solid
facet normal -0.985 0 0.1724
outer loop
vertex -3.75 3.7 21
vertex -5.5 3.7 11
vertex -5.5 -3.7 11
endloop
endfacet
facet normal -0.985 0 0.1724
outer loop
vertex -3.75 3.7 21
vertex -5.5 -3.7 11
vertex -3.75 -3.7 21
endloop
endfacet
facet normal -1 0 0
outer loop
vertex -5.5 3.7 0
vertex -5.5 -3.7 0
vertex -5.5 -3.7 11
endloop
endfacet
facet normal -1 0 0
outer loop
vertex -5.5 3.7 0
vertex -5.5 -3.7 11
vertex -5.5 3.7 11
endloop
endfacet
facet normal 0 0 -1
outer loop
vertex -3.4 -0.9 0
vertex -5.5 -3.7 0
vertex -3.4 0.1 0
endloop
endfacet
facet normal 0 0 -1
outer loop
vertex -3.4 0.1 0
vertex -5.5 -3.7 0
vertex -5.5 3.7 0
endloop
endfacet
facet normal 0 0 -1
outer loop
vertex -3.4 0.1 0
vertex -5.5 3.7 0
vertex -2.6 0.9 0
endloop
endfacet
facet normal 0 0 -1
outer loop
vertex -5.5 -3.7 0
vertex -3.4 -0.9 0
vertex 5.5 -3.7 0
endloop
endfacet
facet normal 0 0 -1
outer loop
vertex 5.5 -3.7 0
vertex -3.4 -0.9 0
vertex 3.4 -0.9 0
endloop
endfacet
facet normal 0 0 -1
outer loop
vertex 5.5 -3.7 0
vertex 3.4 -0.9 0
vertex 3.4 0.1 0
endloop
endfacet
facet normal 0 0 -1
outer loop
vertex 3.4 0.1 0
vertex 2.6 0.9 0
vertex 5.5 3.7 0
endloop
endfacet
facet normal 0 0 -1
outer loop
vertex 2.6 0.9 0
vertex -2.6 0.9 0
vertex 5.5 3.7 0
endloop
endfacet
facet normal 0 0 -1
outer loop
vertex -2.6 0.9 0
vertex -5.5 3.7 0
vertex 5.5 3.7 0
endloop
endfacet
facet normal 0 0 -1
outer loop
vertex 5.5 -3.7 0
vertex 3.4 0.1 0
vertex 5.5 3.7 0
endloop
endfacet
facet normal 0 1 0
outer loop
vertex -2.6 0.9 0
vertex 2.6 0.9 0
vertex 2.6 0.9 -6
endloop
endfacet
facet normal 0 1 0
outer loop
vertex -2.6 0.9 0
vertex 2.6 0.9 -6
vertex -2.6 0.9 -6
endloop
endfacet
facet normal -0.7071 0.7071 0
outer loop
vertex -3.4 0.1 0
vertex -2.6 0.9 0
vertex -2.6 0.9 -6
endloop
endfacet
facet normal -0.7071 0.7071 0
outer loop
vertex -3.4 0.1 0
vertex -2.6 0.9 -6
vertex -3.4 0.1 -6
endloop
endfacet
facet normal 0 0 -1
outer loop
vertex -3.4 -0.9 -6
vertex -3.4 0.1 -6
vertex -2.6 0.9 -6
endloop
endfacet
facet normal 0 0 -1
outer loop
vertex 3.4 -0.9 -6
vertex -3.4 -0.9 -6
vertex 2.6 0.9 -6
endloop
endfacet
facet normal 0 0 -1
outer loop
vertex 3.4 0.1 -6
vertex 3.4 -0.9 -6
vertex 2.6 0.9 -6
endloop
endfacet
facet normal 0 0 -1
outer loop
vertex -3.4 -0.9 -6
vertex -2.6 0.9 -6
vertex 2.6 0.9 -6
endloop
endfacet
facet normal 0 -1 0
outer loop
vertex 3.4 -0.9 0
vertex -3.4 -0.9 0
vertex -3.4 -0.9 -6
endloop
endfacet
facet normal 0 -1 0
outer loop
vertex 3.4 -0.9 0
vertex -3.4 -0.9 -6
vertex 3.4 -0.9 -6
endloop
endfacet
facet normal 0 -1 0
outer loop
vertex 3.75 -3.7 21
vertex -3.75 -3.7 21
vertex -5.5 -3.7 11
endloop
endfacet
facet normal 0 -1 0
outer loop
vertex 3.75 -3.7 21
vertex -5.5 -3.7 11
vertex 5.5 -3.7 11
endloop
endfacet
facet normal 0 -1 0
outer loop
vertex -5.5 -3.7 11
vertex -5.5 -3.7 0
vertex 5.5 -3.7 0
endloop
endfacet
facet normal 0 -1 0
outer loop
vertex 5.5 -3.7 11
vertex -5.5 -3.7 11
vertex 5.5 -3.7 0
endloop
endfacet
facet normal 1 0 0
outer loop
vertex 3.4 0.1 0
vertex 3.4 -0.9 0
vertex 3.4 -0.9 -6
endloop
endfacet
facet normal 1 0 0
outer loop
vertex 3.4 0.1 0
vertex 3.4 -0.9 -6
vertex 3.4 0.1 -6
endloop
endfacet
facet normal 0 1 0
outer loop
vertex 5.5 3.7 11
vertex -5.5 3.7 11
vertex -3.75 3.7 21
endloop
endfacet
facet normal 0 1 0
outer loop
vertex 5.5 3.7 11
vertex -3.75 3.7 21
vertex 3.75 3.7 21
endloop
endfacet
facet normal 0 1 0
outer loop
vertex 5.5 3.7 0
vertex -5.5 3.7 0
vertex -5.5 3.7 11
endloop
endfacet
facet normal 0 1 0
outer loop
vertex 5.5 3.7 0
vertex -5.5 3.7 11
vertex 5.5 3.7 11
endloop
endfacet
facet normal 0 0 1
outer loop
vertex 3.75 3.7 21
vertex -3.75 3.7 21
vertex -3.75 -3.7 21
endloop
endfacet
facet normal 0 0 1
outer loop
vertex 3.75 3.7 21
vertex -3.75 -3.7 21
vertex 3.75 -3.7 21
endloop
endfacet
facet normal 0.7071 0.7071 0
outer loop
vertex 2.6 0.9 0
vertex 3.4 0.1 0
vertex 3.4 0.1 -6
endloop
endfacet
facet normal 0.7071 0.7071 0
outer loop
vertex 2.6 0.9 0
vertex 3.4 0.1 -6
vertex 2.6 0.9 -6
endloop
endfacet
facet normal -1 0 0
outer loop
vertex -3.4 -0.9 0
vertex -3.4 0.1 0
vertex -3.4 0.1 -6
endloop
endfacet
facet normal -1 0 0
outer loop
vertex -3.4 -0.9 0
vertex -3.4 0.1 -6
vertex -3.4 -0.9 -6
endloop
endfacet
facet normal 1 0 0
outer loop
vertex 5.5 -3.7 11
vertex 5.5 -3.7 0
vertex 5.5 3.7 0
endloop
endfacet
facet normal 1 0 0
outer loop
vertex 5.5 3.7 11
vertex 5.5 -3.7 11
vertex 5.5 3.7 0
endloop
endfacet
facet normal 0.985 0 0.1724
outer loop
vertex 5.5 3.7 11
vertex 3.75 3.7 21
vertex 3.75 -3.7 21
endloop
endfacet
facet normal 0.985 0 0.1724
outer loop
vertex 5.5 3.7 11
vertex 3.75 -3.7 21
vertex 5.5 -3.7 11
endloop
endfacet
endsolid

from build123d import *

# Parameters (mm, degrees)
SKICA1_W                 = 11
SKICA1_H                 = 7.4
P_IDAT_VYSUNUT_M1_DEPTH  = 21
ODEBRAT_VYSUNUT_M1_DEPTH = 21
P_IDAT_VYSUNUT_M2_DEPTH  = 6


with BuildPart() as part:
    # Skica1 → Přidat vysunutím1 (new body)
    with BuildSketch(Plane.XY):
        Rectangle(SKICA1_W, SKICA1_H)
    extrude(amount=P_IDAT_VYSUNUT_M1_DEPTH)

    # Skica2 → Odebrat vysunutím1 (cut)
    with BuildSketch(Plane(origin=(0, 3.7, 0), x_dir=(1, 0, 0), z_dir=(0, 1, 0))):
        Polygon((-5.5, -11), (-3.75, -21), (3.75, -21), (5.5, -11), (8.02176331, -11), (9.220966656, -26.189909052), (-8.647163202, -26.189909052), align=None)
    extrude(amount=-ODEBRAT_VYSUNUT_M1_DEPTH, mode=Mode.SUBTRACT)

    # Skica3 → Přidat vysunutím2 (add)
    with BuildSketch(Plane(origin=(0, 0, 0), x_dir=(-1, 0, 0), z_dir=(0, 0, -1))):
        Polygon((-3.4, 0.1), (-2.6, 0.9), (2.6, 0.9), (3.4, 0.1), (3.4, -0.9), (-3.4, -0.9), align=None)
    extrude(amount=P_IDAT_VYSUNUT_M2_DEPTH)


solid = part.part
